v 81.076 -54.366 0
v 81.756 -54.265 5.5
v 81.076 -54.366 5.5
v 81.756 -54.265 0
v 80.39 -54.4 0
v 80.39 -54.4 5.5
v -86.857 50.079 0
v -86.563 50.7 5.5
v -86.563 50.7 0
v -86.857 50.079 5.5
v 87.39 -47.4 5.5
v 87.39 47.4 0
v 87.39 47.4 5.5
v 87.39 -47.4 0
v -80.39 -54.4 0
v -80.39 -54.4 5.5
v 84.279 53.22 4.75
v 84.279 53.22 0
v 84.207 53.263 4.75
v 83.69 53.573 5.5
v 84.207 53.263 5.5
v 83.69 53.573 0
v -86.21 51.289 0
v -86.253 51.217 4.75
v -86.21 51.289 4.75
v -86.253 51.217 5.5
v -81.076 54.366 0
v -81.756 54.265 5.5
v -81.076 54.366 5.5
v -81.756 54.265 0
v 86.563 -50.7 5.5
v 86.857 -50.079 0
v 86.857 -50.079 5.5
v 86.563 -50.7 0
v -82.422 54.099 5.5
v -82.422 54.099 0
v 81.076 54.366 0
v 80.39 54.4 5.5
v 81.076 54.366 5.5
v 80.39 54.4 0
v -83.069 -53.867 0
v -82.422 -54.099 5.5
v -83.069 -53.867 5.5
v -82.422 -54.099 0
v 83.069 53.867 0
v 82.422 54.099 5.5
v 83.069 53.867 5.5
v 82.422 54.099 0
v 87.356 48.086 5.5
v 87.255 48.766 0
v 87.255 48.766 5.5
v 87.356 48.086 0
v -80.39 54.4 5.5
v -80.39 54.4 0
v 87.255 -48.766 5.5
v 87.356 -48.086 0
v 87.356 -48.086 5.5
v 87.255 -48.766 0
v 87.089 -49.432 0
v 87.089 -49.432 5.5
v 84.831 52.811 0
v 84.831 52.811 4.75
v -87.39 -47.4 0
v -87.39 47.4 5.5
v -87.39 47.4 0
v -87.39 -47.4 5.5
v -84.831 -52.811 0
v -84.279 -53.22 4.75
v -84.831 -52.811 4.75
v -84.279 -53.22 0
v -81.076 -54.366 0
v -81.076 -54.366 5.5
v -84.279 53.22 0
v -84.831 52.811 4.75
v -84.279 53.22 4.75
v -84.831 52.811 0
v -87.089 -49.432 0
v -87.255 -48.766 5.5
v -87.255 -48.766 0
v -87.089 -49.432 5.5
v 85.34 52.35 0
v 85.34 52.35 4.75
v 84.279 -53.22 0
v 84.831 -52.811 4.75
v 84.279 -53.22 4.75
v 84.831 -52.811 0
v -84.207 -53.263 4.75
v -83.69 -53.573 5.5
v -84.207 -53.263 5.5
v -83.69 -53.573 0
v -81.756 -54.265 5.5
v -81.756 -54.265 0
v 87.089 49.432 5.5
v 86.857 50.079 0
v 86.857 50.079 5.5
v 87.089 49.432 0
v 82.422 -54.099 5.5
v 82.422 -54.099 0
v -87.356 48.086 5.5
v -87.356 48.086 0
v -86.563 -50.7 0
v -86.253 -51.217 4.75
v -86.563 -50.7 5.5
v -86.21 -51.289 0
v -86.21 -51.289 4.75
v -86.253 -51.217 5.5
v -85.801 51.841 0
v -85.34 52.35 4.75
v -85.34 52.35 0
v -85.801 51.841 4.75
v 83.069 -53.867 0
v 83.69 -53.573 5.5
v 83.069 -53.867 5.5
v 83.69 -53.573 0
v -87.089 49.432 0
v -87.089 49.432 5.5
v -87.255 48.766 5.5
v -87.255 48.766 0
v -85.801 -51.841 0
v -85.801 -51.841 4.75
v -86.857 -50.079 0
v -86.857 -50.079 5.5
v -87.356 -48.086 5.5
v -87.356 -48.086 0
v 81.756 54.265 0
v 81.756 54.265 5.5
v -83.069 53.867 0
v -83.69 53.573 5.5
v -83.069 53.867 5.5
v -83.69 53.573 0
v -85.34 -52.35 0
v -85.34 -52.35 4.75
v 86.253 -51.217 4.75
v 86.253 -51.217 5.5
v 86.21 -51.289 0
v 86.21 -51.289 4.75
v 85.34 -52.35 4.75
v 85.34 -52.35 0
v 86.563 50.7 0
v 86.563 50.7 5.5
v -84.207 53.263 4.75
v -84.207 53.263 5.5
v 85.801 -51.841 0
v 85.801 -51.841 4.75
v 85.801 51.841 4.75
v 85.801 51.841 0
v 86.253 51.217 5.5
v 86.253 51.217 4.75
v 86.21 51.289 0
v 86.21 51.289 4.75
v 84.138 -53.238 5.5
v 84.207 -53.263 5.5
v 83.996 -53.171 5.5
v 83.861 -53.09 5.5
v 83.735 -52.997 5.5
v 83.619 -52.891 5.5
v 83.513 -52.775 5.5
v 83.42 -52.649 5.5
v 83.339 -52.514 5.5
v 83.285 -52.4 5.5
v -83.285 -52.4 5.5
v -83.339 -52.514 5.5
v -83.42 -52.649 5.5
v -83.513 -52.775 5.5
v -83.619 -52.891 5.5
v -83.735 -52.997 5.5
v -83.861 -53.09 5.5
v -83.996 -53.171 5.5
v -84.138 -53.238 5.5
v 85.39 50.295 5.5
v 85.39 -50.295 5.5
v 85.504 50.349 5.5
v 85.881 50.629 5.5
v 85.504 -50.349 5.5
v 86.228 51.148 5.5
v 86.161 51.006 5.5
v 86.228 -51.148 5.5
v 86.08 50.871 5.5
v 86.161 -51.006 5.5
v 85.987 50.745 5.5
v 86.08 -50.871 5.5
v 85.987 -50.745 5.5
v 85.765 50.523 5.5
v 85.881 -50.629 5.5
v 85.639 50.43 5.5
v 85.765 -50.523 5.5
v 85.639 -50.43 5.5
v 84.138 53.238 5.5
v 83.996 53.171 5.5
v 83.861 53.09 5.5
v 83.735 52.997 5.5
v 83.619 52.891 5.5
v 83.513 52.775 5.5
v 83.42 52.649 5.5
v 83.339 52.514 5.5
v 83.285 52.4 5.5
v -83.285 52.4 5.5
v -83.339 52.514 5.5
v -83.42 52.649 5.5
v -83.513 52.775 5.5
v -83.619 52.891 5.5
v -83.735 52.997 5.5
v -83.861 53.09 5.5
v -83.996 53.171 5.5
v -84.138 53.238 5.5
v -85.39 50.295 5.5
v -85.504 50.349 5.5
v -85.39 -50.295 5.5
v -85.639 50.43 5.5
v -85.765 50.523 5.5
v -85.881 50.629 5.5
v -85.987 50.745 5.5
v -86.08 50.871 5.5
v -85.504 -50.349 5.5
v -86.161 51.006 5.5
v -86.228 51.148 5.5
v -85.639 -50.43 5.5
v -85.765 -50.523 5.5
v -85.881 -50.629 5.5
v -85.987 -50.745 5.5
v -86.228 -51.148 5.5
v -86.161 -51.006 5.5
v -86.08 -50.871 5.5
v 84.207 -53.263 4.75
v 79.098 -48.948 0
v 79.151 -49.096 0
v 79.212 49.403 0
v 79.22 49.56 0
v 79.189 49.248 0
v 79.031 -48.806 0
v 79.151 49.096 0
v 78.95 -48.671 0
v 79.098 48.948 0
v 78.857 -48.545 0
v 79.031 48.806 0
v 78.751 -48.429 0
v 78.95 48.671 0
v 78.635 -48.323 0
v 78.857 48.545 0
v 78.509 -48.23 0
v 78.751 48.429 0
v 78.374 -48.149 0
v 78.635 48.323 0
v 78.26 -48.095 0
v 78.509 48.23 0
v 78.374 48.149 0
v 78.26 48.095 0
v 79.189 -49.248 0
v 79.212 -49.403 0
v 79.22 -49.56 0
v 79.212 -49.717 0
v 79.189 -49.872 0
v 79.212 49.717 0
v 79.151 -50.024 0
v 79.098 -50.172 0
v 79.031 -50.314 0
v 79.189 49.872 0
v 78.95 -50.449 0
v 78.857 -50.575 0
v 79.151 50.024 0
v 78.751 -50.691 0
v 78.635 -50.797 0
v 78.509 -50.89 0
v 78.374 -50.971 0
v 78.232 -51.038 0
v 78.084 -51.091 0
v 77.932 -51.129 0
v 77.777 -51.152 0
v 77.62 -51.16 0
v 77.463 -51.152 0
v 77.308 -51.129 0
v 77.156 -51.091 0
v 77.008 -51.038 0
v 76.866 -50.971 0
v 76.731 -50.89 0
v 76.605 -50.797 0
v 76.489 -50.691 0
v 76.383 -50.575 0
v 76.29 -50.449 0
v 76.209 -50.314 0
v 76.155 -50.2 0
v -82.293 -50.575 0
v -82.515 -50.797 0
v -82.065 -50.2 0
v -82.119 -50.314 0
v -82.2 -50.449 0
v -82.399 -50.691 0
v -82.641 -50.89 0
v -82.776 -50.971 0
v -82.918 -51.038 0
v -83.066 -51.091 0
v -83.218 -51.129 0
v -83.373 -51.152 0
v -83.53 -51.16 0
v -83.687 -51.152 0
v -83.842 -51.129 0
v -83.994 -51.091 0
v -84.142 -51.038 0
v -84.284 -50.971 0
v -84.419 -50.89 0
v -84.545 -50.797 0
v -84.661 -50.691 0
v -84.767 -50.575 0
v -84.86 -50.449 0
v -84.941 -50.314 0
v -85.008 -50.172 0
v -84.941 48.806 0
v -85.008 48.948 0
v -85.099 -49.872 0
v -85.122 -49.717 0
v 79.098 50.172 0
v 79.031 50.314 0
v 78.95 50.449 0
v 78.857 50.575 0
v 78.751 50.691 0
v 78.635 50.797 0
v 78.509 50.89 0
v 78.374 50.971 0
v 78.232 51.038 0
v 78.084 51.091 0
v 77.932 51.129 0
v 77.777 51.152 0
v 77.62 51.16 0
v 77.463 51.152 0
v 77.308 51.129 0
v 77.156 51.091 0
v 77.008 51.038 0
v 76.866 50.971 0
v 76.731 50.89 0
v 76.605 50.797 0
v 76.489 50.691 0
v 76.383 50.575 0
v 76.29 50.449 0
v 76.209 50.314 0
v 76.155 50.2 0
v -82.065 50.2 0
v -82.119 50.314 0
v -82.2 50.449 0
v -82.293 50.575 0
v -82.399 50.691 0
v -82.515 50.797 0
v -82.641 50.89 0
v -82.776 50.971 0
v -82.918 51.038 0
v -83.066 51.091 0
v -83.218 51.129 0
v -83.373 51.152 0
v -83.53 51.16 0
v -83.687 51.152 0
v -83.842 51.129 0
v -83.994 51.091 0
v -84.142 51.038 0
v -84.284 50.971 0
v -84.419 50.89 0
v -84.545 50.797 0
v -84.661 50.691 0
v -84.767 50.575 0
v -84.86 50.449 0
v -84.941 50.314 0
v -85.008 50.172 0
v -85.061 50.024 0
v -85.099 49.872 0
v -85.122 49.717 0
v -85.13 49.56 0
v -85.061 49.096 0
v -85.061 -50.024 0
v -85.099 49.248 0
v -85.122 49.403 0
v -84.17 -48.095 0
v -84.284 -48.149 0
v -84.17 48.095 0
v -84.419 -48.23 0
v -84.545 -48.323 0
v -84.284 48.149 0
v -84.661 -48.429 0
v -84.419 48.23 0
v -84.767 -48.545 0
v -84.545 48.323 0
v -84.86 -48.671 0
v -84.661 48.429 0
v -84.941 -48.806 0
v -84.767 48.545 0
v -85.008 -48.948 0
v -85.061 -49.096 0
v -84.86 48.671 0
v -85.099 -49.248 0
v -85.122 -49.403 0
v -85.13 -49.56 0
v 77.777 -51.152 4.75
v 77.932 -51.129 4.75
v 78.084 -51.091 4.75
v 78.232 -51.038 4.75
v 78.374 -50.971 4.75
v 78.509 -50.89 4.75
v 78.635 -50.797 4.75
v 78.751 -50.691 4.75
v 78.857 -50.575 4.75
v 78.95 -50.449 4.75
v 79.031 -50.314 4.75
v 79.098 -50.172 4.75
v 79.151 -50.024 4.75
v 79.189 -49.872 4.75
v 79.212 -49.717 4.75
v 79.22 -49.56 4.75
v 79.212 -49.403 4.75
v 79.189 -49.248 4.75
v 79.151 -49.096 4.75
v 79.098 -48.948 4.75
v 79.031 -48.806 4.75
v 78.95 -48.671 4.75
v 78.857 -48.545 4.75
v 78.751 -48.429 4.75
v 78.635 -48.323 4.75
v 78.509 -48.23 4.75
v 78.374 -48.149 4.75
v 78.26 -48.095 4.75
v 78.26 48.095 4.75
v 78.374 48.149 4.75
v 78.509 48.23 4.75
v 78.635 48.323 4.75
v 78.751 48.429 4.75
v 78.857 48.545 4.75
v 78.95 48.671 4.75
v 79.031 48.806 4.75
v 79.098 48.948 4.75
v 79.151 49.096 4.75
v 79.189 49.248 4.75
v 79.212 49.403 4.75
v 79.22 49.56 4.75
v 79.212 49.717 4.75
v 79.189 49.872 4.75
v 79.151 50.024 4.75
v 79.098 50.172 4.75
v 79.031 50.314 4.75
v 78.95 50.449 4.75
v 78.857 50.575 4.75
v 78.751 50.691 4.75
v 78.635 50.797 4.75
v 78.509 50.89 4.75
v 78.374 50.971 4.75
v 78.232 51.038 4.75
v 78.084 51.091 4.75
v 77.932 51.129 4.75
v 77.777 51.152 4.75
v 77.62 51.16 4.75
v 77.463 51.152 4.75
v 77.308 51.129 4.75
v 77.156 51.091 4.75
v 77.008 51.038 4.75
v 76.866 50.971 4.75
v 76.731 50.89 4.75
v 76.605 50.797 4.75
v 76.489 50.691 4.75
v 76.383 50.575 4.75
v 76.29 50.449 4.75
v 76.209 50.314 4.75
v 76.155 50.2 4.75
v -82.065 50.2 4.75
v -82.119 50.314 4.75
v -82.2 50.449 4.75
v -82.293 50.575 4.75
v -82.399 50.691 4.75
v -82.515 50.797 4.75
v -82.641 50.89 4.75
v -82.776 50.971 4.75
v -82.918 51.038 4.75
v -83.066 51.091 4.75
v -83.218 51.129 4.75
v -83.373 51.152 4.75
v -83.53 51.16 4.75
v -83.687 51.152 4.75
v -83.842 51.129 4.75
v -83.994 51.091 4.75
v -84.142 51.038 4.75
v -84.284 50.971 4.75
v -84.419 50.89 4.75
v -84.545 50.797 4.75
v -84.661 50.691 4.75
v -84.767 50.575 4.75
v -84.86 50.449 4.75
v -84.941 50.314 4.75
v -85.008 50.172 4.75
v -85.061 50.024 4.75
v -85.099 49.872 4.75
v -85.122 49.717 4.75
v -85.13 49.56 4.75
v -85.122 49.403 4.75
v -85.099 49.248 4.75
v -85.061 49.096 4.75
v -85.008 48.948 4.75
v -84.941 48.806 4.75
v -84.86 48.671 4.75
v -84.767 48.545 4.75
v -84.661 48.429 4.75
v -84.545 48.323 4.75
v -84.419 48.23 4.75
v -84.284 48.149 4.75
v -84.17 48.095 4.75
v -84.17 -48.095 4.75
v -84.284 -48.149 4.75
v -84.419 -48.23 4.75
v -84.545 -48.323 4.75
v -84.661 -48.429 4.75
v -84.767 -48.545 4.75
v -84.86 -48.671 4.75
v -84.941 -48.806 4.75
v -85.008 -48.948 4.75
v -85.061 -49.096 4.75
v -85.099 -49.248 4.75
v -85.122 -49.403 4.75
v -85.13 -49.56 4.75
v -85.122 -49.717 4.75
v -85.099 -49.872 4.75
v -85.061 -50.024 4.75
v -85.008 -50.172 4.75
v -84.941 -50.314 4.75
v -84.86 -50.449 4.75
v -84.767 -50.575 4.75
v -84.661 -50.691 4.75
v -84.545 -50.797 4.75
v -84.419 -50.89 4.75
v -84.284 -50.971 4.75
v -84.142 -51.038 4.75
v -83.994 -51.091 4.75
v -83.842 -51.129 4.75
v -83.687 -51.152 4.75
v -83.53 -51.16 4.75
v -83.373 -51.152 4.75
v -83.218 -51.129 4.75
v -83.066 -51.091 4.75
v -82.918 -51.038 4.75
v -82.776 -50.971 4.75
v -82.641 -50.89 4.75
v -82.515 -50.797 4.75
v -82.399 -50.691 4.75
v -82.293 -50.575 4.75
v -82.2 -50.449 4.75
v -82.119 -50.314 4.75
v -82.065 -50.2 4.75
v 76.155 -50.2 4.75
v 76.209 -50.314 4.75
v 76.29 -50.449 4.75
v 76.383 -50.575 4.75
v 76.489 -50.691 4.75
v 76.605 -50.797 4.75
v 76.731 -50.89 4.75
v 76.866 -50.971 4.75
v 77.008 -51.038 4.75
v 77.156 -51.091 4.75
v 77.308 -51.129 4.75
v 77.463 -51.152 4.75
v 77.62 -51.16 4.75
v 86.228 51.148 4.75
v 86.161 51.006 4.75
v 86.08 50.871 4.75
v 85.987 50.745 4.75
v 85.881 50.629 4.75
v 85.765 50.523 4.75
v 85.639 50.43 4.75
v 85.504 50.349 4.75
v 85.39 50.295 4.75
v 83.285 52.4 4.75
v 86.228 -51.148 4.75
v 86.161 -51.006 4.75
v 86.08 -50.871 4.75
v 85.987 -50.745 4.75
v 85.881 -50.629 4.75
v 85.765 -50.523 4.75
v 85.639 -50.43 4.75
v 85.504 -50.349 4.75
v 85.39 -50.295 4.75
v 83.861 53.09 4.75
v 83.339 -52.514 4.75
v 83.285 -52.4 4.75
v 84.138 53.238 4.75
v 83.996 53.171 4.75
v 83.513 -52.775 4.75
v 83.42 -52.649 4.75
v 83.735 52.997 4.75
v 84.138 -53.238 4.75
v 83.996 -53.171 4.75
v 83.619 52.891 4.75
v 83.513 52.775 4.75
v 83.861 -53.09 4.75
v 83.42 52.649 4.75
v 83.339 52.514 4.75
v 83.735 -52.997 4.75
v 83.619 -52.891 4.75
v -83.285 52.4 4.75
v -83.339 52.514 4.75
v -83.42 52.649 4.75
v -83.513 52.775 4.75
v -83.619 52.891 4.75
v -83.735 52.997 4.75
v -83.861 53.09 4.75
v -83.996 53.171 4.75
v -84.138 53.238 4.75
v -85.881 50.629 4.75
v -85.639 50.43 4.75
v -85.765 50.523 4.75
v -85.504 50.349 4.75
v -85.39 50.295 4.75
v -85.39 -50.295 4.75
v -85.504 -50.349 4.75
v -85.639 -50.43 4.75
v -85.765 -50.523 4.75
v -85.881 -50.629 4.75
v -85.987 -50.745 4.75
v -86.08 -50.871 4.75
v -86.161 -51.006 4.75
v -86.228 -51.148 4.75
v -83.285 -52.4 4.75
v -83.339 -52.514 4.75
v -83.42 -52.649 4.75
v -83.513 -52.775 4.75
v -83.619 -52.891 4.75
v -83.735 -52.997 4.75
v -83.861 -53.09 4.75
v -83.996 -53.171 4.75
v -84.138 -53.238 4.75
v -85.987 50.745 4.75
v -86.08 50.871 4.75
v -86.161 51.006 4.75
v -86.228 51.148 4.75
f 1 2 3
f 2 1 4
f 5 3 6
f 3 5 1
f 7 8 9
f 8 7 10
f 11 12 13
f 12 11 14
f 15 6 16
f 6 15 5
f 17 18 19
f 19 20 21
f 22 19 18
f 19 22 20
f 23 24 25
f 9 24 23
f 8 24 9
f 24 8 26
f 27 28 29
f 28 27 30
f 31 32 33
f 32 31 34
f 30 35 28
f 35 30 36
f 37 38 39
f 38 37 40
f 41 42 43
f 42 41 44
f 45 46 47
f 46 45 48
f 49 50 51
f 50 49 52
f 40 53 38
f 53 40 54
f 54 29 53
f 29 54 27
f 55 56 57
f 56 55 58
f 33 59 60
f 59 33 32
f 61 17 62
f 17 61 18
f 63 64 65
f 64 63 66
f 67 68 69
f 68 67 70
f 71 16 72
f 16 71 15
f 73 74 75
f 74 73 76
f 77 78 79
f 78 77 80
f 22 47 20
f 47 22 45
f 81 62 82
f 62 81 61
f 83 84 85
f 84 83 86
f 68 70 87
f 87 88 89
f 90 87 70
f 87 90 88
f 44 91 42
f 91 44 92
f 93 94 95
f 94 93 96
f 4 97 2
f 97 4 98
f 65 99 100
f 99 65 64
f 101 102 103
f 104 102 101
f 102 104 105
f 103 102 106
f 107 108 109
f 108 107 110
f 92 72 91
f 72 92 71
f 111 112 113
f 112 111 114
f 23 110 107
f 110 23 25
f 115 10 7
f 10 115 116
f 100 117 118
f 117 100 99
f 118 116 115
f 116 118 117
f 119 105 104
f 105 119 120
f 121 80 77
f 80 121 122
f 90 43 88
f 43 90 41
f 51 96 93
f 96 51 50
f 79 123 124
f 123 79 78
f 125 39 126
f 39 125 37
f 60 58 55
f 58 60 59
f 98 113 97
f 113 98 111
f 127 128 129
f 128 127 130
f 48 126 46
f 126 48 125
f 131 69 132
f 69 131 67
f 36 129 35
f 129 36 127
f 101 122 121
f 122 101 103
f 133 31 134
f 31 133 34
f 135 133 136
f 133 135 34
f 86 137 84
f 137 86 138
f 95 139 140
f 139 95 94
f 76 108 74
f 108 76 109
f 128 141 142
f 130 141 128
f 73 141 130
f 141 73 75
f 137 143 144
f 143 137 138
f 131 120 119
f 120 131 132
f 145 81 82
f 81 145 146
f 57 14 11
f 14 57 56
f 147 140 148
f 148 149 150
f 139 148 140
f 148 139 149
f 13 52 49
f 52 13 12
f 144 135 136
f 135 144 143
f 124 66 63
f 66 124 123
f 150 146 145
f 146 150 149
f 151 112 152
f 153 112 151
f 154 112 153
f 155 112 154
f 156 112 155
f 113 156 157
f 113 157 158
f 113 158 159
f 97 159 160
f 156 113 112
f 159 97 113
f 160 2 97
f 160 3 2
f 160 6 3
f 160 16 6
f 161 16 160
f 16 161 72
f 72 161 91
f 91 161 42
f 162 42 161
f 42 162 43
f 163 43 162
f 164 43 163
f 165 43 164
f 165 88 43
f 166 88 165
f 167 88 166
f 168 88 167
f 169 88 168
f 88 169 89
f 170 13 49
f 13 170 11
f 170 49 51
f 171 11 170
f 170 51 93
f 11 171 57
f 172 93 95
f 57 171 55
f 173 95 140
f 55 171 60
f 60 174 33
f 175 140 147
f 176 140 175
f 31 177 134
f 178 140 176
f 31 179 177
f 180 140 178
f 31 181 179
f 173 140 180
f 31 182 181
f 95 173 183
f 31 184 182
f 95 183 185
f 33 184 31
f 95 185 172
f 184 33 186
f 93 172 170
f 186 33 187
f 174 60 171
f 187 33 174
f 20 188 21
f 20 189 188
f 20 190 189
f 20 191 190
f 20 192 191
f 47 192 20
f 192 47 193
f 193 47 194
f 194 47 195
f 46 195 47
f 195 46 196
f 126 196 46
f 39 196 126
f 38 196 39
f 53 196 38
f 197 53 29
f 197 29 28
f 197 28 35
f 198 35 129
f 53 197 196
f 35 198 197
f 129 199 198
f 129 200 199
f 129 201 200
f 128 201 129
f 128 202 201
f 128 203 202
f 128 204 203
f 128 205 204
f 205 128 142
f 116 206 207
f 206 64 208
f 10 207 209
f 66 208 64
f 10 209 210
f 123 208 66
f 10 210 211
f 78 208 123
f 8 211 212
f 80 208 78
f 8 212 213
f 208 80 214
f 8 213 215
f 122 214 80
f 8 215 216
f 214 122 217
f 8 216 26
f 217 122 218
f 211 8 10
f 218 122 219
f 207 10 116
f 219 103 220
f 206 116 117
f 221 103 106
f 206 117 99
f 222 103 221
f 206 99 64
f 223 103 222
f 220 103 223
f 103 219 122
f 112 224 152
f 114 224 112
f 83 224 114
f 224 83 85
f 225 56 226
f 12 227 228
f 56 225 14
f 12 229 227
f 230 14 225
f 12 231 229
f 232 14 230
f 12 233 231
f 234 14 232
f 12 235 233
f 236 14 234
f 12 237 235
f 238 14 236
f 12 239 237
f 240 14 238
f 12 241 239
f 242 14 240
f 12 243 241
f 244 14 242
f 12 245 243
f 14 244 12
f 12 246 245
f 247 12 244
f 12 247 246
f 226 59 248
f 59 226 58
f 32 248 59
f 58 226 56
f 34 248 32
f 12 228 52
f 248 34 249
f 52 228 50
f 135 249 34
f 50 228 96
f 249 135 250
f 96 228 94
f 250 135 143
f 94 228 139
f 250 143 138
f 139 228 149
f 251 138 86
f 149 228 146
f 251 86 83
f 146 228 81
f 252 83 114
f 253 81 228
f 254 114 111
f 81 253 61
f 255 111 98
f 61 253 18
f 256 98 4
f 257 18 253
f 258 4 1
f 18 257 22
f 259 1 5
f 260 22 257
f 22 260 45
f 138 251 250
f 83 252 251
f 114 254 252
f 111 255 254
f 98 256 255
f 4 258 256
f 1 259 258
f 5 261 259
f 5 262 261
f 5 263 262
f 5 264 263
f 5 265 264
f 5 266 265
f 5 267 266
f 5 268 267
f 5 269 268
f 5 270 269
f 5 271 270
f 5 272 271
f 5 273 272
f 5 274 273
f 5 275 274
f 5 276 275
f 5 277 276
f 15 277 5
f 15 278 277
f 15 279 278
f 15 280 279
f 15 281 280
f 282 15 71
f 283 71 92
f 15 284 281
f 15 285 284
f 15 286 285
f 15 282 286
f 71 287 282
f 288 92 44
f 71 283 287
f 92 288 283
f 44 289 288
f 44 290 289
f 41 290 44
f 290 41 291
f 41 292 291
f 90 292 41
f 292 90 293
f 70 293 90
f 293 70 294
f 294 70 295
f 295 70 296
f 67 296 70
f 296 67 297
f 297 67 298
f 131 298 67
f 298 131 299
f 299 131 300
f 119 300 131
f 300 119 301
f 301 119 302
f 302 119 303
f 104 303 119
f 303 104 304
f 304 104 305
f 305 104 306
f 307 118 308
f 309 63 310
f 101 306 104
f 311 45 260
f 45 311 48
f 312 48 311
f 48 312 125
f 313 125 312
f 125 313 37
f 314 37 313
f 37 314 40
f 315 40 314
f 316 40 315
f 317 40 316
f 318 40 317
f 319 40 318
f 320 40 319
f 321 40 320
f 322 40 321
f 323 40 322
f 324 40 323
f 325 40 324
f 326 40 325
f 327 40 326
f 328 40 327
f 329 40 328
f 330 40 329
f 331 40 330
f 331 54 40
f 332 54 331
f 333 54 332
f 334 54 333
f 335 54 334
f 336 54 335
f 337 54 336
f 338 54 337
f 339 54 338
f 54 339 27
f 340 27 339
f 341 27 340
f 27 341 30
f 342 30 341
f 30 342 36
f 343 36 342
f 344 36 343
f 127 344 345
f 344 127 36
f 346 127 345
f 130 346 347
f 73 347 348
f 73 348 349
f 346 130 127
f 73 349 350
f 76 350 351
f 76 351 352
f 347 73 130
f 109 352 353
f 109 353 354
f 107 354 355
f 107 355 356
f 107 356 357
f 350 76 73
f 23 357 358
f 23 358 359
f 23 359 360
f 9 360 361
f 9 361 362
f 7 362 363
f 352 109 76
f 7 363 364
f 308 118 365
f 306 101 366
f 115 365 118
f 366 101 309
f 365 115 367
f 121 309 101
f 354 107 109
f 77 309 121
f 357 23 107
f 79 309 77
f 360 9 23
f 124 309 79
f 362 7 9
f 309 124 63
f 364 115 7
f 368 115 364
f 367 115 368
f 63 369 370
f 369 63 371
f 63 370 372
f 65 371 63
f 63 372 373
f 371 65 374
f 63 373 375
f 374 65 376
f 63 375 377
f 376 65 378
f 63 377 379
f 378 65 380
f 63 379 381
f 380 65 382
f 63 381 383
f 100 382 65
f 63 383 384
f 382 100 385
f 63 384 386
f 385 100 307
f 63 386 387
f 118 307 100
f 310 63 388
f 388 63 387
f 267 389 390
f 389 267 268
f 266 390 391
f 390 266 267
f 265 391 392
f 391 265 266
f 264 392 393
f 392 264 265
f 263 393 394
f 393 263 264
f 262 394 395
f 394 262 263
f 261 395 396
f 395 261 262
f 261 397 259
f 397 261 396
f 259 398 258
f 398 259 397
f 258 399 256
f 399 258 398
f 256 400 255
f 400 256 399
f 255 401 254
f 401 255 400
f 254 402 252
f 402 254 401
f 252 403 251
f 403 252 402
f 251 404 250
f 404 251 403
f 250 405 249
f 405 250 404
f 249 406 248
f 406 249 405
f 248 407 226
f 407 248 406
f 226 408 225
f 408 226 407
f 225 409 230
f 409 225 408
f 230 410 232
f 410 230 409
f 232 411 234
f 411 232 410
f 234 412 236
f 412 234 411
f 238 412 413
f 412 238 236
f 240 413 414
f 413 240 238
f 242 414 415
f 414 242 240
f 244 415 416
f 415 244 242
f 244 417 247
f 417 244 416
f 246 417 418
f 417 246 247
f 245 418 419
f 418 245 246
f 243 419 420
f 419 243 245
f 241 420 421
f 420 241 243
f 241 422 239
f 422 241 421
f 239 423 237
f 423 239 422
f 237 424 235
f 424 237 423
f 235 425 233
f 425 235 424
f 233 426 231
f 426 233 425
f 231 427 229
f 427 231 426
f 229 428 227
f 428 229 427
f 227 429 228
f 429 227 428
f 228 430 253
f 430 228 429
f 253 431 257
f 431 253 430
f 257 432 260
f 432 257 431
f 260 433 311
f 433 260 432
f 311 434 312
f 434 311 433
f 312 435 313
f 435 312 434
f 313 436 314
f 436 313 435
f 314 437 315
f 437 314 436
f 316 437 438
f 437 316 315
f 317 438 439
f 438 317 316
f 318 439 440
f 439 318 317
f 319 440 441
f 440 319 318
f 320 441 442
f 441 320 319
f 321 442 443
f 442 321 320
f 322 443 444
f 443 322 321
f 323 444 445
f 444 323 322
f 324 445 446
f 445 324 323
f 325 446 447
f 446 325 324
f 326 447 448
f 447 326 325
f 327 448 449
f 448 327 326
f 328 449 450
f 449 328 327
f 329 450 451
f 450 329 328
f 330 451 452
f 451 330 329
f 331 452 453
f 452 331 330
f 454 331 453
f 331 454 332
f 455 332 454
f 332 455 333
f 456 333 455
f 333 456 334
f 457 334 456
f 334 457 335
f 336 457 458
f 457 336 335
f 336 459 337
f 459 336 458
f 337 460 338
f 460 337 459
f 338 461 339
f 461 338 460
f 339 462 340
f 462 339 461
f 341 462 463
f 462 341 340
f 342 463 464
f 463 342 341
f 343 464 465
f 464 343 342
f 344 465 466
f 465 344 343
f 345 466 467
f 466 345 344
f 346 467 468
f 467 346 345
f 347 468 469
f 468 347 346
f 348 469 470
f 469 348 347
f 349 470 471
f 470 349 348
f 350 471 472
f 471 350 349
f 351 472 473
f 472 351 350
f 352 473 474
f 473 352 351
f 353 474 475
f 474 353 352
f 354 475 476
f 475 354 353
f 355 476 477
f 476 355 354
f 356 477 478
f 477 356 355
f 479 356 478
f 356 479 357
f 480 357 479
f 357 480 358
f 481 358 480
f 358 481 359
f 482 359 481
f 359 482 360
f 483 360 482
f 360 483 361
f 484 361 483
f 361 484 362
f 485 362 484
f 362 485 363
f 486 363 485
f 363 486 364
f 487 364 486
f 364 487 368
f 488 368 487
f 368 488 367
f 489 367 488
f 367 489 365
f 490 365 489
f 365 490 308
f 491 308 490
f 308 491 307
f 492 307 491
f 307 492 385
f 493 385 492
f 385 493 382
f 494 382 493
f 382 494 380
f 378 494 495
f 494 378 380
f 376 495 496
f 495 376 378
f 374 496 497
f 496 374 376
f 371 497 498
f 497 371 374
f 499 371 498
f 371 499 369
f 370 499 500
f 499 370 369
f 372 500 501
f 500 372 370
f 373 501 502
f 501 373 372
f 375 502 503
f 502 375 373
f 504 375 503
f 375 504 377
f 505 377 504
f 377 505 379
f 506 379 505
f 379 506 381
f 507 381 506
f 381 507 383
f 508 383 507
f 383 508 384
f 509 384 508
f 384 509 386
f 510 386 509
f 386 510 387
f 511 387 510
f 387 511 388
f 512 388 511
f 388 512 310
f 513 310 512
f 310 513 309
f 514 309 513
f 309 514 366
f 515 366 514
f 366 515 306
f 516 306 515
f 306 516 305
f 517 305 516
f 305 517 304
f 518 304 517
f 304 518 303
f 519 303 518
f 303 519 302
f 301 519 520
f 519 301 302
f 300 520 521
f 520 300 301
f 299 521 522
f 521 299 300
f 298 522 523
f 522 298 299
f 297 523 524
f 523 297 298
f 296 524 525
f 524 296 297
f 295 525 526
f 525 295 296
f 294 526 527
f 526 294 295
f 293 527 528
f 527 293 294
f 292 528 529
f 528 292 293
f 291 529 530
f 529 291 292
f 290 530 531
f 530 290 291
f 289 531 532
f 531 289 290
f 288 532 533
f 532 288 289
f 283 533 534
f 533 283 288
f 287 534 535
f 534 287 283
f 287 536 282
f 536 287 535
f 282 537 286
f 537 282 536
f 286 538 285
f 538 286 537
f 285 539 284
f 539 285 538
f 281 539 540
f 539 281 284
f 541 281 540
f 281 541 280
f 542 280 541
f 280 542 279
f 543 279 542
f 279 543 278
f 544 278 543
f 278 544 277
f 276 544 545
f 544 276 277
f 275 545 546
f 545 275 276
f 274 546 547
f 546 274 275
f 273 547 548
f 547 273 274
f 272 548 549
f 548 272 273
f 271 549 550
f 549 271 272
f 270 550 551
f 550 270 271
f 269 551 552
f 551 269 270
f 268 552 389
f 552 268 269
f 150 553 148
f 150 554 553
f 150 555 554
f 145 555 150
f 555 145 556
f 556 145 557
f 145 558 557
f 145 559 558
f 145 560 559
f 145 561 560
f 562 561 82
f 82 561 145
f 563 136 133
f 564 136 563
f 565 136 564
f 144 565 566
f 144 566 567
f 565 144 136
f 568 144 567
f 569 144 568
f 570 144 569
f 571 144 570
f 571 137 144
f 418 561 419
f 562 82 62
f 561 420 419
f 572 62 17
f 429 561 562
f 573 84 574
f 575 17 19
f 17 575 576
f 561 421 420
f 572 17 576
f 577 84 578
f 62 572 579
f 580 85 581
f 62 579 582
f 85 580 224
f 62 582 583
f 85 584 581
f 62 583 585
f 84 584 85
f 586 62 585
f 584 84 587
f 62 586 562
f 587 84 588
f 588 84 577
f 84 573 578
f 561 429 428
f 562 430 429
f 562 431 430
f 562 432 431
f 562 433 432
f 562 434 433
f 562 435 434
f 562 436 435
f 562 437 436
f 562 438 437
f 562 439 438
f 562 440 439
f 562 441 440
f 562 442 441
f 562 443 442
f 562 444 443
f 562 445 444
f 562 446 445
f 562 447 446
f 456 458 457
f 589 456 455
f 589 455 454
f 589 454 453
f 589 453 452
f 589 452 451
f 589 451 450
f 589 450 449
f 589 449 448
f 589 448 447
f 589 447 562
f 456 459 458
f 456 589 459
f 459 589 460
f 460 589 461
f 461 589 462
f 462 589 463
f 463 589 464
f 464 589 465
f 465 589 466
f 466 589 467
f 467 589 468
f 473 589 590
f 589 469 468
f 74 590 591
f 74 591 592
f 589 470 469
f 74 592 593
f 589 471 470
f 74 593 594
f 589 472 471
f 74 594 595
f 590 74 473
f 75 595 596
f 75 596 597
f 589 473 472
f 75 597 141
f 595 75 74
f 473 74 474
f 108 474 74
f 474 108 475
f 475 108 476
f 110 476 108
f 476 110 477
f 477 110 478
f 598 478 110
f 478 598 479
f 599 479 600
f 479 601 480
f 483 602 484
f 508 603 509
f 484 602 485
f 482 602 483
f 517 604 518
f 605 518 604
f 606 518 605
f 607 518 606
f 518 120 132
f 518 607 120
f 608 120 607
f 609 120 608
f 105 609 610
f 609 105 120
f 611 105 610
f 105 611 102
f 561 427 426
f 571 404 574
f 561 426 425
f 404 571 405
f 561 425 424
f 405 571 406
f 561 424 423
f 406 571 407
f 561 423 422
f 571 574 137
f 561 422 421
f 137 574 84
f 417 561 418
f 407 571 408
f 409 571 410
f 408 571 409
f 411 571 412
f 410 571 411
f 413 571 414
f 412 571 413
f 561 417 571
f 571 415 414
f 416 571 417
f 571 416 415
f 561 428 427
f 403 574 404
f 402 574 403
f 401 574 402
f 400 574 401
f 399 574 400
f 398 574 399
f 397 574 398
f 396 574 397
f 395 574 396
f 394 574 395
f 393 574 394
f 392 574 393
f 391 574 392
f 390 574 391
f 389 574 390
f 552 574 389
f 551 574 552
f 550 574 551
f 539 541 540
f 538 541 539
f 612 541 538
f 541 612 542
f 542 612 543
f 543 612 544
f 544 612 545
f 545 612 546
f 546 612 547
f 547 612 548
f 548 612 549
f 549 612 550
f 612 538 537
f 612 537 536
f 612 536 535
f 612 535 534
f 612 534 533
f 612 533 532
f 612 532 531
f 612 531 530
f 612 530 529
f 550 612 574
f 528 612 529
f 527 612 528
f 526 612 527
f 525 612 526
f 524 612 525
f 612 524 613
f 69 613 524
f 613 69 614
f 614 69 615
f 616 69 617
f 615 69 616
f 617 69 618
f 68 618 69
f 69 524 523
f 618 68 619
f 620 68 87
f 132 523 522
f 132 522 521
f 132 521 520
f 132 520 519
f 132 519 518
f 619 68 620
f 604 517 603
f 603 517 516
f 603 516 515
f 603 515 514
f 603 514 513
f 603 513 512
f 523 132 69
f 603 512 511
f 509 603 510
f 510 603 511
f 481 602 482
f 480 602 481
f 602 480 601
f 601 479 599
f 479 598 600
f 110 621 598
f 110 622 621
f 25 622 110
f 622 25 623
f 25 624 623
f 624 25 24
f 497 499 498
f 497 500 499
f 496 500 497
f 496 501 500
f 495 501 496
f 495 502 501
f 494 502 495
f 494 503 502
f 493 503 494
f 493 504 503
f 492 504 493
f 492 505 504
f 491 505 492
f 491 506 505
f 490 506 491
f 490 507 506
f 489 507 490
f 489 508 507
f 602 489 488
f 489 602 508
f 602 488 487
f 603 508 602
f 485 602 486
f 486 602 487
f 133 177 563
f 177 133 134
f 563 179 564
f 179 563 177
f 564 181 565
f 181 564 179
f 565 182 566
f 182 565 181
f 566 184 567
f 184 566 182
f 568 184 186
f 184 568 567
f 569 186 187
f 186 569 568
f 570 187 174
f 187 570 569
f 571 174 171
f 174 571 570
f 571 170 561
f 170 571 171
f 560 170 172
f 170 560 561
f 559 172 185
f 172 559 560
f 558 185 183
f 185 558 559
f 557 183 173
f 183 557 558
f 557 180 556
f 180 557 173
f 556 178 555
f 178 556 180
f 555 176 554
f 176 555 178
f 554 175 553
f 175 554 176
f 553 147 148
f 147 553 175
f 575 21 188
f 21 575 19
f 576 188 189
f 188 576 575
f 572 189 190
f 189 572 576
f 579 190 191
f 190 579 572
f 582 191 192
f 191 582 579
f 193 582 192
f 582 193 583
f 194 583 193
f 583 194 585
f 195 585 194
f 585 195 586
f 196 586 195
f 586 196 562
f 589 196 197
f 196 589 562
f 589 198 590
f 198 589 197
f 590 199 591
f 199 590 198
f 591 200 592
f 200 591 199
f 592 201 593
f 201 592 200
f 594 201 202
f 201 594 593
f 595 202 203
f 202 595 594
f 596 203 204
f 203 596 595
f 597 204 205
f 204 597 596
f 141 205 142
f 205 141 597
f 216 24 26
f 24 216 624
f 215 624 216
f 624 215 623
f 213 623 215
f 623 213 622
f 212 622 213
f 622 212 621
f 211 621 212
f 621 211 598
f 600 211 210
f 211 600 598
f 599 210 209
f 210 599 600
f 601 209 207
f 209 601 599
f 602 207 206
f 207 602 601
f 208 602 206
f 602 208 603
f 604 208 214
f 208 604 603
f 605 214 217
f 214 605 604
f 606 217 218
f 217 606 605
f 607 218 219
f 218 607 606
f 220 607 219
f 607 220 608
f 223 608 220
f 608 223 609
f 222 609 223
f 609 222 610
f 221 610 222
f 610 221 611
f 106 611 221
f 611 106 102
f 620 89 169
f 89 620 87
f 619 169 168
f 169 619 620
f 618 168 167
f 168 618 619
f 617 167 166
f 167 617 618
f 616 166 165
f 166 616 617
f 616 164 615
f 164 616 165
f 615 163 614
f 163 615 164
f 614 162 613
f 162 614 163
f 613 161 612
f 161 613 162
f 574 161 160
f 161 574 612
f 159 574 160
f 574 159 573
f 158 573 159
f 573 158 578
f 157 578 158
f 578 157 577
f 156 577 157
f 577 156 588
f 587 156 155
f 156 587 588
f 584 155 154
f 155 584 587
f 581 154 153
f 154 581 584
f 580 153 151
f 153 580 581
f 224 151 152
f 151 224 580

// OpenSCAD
// file: pcbway.scad
// Fabrication rules for PCBWay CNC-milled, anodised 3 mm aluminium plates.
// Values are working assumptions for a quote; confirm against the PCBWay quote/DFM reply.

plate_t        = 3.0;    // stock thickness, aluminium 6061-T6 (or 5052), anodised after machining
min_inner_r    = 1.5;    // smallest inside corner radius of a milled pocket/notch (tool Ø ≤ 3 mm)
min_web        = 2.0;    // minimum material between two features or a feature and an edge
fit_gap        = 0.20;   // clearance per side between two mating aluminium parts
anodise_build  = 0.02;   // anodising adds ~10-25 µm per surface; ignored for these clearances
// Finish (owner, 20 Nov 2026): slightly darker than natural aluminium.
// Order as: bead-blasted, anodised grey / light gunmetal; ask PCBWay for a colour sample first.
finish_note    = "bead blast + grey anodise, slightly darker than natural aluminium";
finish_rgb     = [0.55, 0.56, 0.58];

// Countersunk M3 (ISO 10642 / DIN 7991 head Ø6 mm, 90°)
m3_clear_d     = 3.4;
m3_csk_d       = 6.5;
m3_csk_angle   = 90;

// M2.5 tapped through hole for M/F standoffs (tap drill 2.05 mm; tap after anodising,
// or mask the holes, so the threads stay clean)
m25_tap_d      = 2.05;

$fn = 64;

// 2D rounded rectangle with origin at the lower-left corner
module rrect(w, h, r) {
    if (r <= 0) square([w, h]);
    else translate([r, r]) offset(r = r) square([w - 2 * r, h - 2 * r]);
}

// Countersunk through hole, plate occupying z = 0..t, head on the z = t side
module csk_hole(t = plate_t, d = m3_clear_d, dk = m3_csk_d, angle = m3_csk_angle) {
    depth = (dk - d) / 2 / tan(angle / 2);
    translate([0, 0, -1]) cylinder(d = d, h = t + 2);
    translate([0, 0, t - depth]) cylinder(d1 = d, d2 = dk, h = depth + 0.001);
    translate([0, 0, t]) cylinder(d = dk, h = 1);
}
// main file
// DAW ONE screen bezel ring — anodised aluminium, PCBWay CNC (same finish as the plates).
//
// Owner's choice (20 Nov 2026): the Waveshare 7" DSI LCD (E) module is taped with its panel back
// onto the wooden front face, so glass + panel stand proud of the case. This ring closes that
// band: it surrounds the LCD panel and holds the cover glass in a front pocket, flush with it.
//
// Module data from the Waveshare 7inch DSI LCD (E) STEP, 2025-04-28 (SHA-256 6ae28f71…, as in
// docs/design/fit-d1-sources.json), sliced by depth from the glass front:
//   0.00-0.75  cover glass 170.18 x 104.20
//   0.75-5.00  LCD panel 161.83 x 99.80, off-centre by 2.96 mm along the width
//   5.60-15.3  driver board, flex and standoffs, at most 138.6 x 76.0 (fits the case opening)
// The screen is mounted with the panel offset toward -X (rotate the image in software if needed).
//
// Coordinates: X right seen from the front, Y up, origin at the case centre on the wooden front
// face; Z = distance in front of the wood (0 = wood face, ring front = depth).
include <pcbway.scad>

/* [Module] */
glass_w   = 170.18;
glass_h   = 104.20;
glass_t   = 0.75;
panel_w   = 161.83;
panel_h   = 99.80;
panel_t   = 4.25;
panel_dx  = -2.955;     // panel centre relative to the glass centre (X)
tape_t    = 0.5;        // double-sided tape between panel back and wood

/* [Ring] */
gap       = 0.3;        // clearance per side to glass and panel
rim       = 2.0;        // visible aluminium width around the glass
corner_r  = 7.0;        // outer corner radius (case corners are R4.5)
relief_r  = 1.6;        // corner reliefs so square glass/panel corners seat in milled pockets

/* [Case — for reference] */
case_w    = 169.18;
case_h    = 103.20;

depth     = tape_t + panel_t + glass_t;   // ring front flush with the glass front
pocket_w  = glass_w + 2 * gap;
pocket_h  = glass_h + 2 * gap;
open_w    = panel_w + 2 * gap;
open_h    = panel_h + 2 * gap;
outer_w   = pocket_w + 2 * rim;
outer_h   = pocket_h + 2 * rim;

module centred_rrect(w, h, r) translate([-w / 2, -h / 2]) rrect(w, h, r);

module with_reliefs(w, h) {
    centred_rrect(w, h, 0);
    for (sx = [-1, 1], sy = [-1, 1]) translate([sx * (w / 2 - relief_r * 0.4), sy * (h / 2 - relief_r * 0.4)])
        circle(r = relief_r);
}

module bezel_ring() {
    difference() {
        linear_extrude(depth) centred_rrect(outer_w, outer_h, corner_r);
        // opening around the LCD panel, through
        translate([panel_dx, 0, -1]) linear_extrude(depth + 2) with_reliefs(open_w, open_h);
        // front pocket for the cover glass
        translate([0, 0, depth - glass_t]) linear_extrude(glass_t + 1) with_reliefs(pocket_w, pocket_h);
    }
}

bezel_ring();

// Notes for the drawing:
// - Stock 6 mm plate; ring depth = tape + panel + glass (5.5 mm with 0.5 mm tape).
// - Outer size 174.8 x 108.8 mm: overhangs the 169.18 x 103.20 case by ~2.8 mm all round.
// - Walls beside the panel: ~3.2 mm (-X side), ~9.1 mm (+X side), ~4.2 mm top and bottom.
// - Contact with the wood front face: ~0.4 mm (-X), ~6.3 mm (+X), ~1.4 mm top and bottom,
//   so bond it mainly to the panel and glass edges.
// - The display's flex tail lies 0.1 mm behind the panel back at the -X end, over the wood:
//   keep the tape at least 0.5 mm thick there, or relieve the wood locally.
